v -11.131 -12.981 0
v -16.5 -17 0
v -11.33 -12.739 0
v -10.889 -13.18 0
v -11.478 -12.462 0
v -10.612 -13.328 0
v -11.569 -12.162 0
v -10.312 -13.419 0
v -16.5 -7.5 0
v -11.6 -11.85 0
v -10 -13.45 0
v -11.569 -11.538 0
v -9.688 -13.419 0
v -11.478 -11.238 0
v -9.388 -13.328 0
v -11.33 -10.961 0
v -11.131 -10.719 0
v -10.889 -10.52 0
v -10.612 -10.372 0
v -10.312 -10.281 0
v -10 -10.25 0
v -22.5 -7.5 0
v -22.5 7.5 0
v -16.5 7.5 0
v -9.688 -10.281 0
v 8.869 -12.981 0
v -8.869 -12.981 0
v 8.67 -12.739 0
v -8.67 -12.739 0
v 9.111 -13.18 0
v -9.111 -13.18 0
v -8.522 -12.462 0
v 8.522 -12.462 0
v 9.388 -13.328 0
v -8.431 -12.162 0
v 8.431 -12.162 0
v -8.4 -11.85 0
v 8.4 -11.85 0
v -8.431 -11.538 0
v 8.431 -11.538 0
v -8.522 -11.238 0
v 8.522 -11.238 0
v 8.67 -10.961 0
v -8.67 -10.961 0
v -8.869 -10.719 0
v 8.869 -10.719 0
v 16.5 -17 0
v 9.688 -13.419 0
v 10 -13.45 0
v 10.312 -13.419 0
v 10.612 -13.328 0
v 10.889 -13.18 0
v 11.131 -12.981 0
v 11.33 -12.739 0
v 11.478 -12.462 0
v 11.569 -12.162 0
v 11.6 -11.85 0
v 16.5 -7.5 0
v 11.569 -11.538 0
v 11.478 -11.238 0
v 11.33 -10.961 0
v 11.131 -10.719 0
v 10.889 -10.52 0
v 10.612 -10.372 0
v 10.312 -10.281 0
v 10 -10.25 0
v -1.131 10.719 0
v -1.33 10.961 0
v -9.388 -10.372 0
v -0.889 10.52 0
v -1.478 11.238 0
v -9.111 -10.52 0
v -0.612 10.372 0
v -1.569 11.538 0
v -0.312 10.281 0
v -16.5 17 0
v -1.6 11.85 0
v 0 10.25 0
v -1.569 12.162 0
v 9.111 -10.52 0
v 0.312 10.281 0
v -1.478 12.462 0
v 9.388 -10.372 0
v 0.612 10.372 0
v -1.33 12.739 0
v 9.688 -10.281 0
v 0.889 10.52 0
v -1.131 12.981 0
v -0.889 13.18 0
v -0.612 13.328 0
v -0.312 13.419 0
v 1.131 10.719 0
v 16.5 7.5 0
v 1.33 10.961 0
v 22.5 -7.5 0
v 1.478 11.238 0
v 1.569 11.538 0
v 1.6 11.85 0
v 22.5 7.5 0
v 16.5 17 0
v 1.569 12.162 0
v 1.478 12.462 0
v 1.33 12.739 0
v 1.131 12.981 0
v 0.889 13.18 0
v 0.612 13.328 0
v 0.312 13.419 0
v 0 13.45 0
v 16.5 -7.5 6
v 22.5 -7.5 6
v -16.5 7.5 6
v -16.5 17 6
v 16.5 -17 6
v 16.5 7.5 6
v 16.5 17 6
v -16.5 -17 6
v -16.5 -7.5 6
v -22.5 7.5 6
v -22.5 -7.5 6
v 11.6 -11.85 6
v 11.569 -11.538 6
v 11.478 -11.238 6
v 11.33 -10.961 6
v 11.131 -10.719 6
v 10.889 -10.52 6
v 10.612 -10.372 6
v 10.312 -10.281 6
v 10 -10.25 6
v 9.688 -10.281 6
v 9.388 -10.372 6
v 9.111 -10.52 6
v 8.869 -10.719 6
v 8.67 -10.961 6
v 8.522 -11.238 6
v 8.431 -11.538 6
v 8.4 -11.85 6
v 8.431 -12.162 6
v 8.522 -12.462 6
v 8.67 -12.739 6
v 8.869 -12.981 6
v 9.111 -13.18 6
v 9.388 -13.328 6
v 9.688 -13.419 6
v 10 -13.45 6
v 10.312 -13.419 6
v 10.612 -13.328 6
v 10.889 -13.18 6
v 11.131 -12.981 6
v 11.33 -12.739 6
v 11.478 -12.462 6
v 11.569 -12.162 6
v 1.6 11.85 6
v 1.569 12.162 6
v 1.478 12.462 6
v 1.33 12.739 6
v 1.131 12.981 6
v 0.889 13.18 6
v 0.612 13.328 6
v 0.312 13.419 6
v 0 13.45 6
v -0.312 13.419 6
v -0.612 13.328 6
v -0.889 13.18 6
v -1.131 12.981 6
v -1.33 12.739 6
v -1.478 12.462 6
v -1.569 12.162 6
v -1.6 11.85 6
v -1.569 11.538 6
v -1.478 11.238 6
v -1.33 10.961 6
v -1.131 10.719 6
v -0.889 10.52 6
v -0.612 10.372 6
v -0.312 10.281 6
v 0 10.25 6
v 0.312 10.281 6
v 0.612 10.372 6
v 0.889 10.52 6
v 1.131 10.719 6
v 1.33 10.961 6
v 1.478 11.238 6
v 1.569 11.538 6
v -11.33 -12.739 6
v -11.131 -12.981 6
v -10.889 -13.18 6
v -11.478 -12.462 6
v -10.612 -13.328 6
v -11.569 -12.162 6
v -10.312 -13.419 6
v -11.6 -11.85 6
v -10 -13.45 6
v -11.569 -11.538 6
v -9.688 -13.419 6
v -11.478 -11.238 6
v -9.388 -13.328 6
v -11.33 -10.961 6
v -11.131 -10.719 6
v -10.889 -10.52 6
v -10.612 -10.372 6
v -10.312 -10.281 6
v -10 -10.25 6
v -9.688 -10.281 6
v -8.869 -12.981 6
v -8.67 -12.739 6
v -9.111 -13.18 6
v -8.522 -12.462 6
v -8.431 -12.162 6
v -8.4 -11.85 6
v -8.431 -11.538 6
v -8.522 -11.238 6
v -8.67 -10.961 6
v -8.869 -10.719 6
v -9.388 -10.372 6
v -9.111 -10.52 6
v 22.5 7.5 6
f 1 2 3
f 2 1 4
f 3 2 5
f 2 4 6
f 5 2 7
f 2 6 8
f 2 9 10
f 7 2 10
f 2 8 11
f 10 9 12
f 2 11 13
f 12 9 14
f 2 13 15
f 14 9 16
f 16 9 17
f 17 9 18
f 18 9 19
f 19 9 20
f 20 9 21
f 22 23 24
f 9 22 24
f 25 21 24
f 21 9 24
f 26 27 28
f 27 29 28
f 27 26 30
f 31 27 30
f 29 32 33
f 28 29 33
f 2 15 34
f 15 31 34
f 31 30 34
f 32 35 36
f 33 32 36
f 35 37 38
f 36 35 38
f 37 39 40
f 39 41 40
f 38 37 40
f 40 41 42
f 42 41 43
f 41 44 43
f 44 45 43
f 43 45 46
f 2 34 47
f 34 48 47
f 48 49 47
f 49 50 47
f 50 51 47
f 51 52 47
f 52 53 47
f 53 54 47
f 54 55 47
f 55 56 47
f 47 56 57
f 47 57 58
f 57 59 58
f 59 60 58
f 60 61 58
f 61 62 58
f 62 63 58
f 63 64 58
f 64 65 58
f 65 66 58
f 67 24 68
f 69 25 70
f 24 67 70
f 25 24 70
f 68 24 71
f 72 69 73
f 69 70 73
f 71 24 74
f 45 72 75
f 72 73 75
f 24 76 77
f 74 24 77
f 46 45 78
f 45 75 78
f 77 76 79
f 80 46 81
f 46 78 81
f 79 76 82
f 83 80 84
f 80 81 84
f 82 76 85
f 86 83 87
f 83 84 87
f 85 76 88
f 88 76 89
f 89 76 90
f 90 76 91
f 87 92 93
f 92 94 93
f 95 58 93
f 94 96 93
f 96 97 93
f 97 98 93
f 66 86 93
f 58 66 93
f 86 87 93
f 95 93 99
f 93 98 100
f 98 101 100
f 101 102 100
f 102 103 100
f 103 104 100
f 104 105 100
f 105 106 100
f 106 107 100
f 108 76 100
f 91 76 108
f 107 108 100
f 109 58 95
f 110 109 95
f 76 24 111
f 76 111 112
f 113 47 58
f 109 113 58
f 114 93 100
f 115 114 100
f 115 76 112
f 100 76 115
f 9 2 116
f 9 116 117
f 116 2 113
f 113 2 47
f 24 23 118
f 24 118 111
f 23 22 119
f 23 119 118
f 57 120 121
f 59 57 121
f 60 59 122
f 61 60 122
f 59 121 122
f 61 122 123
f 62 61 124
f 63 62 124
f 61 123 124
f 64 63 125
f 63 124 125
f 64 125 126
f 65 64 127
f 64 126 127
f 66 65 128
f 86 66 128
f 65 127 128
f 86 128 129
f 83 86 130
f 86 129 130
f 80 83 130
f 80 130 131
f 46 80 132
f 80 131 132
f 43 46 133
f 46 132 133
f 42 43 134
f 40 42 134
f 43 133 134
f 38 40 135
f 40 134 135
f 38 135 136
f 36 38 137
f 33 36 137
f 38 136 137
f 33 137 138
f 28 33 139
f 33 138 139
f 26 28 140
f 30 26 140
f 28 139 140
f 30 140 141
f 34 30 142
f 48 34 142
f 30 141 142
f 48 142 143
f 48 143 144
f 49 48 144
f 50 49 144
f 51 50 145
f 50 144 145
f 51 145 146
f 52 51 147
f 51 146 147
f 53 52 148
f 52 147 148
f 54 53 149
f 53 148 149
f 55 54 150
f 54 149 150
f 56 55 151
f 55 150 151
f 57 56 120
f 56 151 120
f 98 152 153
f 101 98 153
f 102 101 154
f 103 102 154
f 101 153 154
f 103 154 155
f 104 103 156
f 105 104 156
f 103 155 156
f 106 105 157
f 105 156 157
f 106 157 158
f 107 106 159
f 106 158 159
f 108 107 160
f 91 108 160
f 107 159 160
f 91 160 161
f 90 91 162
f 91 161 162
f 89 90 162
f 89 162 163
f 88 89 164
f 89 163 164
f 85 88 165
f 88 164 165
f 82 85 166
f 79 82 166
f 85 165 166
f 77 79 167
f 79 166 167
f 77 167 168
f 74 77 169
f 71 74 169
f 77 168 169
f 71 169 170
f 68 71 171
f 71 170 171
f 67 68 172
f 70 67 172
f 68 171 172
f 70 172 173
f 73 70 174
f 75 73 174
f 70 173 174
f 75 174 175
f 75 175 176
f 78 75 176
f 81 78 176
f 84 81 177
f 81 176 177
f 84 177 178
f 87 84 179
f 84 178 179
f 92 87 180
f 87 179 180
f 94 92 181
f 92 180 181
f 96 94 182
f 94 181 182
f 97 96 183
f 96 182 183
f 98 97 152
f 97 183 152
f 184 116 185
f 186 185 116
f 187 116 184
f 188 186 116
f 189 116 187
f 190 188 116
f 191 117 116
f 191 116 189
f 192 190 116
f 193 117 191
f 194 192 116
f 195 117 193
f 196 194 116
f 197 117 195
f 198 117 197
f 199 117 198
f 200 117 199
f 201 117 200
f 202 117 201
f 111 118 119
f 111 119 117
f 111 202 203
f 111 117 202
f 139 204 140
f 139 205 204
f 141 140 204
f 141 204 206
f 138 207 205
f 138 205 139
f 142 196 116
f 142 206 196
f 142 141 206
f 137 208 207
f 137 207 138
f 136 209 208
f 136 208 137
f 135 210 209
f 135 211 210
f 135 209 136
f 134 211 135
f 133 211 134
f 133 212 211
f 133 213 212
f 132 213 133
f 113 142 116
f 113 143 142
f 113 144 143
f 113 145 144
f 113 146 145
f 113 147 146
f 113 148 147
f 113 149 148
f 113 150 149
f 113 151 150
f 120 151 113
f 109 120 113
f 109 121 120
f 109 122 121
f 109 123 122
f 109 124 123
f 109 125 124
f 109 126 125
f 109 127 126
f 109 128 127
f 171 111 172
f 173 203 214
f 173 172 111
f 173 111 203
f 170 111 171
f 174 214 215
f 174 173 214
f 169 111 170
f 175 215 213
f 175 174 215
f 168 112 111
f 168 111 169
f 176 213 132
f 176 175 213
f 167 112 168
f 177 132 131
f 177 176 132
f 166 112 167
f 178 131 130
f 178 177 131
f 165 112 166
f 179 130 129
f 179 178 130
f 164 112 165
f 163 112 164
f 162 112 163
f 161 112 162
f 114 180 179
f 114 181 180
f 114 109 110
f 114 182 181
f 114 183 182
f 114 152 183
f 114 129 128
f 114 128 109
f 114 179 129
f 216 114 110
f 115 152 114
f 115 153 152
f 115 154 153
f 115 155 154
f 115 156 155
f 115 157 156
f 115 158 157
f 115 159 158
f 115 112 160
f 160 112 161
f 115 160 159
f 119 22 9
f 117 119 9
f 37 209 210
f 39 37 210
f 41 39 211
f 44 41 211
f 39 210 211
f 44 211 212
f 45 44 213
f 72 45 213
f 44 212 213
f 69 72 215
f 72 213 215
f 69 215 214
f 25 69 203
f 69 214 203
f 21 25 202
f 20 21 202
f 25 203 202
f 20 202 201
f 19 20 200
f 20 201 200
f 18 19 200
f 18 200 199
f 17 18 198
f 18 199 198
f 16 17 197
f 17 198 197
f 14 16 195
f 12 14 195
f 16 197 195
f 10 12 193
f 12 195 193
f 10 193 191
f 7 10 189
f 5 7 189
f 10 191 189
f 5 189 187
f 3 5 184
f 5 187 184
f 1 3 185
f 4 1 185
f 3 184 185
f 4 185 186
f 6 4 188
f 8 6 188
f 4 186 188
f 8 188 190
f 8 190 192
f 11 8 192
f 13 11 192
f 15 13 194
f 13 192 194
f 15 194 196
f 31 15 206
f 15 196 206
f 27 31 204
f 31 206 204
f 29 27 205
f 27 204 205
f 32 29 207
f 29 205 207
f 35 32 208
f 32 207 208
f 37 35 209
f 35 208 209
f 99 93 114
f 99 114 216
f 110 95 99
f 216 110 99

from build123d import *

# Parameters (mm, degrees)
F0_W     = 33
F0_H     = 34
F1_DEPTH = 6
F3_W     = 6
F3_H     = 15
F4_DEPTH = 6
F2_R     = 1.6
F5_DEPTH = 6


with BuildPart() as f1:
    # F0 (on Top) → F1 (new body)
    with BuildSketch(Plane.XY):
        Rectangle(F0_W, F0_H)
    extrude(amount=F1_DEPTH)

    # F3 (on Top) → F4 (join)
    with BuildSketch(Plane.XY):
        with Locations((-19.5, 0)):
            Rectangle(F3_W, F3_H)
        with Locations((19.5, 0)):
            Rectangle(F3_W, F3_H)
    extrude(amount=F4_DEPTH)

    # F2 (on face) → F5 (cut, through all)
    with BuildSketch(Plane.XY.offset(6)):
        with Locations((-10, -11.85)):
            Circle(F2_R)
        with Locations((10, -11.85)):
            Circle(F2_R)
        with Locations((0, 11.85)):
            Circle(F2_R)
    extrude(amount=-F5_DEPTH, mode=Mode.SUBTRACT)


solid = f1.part
